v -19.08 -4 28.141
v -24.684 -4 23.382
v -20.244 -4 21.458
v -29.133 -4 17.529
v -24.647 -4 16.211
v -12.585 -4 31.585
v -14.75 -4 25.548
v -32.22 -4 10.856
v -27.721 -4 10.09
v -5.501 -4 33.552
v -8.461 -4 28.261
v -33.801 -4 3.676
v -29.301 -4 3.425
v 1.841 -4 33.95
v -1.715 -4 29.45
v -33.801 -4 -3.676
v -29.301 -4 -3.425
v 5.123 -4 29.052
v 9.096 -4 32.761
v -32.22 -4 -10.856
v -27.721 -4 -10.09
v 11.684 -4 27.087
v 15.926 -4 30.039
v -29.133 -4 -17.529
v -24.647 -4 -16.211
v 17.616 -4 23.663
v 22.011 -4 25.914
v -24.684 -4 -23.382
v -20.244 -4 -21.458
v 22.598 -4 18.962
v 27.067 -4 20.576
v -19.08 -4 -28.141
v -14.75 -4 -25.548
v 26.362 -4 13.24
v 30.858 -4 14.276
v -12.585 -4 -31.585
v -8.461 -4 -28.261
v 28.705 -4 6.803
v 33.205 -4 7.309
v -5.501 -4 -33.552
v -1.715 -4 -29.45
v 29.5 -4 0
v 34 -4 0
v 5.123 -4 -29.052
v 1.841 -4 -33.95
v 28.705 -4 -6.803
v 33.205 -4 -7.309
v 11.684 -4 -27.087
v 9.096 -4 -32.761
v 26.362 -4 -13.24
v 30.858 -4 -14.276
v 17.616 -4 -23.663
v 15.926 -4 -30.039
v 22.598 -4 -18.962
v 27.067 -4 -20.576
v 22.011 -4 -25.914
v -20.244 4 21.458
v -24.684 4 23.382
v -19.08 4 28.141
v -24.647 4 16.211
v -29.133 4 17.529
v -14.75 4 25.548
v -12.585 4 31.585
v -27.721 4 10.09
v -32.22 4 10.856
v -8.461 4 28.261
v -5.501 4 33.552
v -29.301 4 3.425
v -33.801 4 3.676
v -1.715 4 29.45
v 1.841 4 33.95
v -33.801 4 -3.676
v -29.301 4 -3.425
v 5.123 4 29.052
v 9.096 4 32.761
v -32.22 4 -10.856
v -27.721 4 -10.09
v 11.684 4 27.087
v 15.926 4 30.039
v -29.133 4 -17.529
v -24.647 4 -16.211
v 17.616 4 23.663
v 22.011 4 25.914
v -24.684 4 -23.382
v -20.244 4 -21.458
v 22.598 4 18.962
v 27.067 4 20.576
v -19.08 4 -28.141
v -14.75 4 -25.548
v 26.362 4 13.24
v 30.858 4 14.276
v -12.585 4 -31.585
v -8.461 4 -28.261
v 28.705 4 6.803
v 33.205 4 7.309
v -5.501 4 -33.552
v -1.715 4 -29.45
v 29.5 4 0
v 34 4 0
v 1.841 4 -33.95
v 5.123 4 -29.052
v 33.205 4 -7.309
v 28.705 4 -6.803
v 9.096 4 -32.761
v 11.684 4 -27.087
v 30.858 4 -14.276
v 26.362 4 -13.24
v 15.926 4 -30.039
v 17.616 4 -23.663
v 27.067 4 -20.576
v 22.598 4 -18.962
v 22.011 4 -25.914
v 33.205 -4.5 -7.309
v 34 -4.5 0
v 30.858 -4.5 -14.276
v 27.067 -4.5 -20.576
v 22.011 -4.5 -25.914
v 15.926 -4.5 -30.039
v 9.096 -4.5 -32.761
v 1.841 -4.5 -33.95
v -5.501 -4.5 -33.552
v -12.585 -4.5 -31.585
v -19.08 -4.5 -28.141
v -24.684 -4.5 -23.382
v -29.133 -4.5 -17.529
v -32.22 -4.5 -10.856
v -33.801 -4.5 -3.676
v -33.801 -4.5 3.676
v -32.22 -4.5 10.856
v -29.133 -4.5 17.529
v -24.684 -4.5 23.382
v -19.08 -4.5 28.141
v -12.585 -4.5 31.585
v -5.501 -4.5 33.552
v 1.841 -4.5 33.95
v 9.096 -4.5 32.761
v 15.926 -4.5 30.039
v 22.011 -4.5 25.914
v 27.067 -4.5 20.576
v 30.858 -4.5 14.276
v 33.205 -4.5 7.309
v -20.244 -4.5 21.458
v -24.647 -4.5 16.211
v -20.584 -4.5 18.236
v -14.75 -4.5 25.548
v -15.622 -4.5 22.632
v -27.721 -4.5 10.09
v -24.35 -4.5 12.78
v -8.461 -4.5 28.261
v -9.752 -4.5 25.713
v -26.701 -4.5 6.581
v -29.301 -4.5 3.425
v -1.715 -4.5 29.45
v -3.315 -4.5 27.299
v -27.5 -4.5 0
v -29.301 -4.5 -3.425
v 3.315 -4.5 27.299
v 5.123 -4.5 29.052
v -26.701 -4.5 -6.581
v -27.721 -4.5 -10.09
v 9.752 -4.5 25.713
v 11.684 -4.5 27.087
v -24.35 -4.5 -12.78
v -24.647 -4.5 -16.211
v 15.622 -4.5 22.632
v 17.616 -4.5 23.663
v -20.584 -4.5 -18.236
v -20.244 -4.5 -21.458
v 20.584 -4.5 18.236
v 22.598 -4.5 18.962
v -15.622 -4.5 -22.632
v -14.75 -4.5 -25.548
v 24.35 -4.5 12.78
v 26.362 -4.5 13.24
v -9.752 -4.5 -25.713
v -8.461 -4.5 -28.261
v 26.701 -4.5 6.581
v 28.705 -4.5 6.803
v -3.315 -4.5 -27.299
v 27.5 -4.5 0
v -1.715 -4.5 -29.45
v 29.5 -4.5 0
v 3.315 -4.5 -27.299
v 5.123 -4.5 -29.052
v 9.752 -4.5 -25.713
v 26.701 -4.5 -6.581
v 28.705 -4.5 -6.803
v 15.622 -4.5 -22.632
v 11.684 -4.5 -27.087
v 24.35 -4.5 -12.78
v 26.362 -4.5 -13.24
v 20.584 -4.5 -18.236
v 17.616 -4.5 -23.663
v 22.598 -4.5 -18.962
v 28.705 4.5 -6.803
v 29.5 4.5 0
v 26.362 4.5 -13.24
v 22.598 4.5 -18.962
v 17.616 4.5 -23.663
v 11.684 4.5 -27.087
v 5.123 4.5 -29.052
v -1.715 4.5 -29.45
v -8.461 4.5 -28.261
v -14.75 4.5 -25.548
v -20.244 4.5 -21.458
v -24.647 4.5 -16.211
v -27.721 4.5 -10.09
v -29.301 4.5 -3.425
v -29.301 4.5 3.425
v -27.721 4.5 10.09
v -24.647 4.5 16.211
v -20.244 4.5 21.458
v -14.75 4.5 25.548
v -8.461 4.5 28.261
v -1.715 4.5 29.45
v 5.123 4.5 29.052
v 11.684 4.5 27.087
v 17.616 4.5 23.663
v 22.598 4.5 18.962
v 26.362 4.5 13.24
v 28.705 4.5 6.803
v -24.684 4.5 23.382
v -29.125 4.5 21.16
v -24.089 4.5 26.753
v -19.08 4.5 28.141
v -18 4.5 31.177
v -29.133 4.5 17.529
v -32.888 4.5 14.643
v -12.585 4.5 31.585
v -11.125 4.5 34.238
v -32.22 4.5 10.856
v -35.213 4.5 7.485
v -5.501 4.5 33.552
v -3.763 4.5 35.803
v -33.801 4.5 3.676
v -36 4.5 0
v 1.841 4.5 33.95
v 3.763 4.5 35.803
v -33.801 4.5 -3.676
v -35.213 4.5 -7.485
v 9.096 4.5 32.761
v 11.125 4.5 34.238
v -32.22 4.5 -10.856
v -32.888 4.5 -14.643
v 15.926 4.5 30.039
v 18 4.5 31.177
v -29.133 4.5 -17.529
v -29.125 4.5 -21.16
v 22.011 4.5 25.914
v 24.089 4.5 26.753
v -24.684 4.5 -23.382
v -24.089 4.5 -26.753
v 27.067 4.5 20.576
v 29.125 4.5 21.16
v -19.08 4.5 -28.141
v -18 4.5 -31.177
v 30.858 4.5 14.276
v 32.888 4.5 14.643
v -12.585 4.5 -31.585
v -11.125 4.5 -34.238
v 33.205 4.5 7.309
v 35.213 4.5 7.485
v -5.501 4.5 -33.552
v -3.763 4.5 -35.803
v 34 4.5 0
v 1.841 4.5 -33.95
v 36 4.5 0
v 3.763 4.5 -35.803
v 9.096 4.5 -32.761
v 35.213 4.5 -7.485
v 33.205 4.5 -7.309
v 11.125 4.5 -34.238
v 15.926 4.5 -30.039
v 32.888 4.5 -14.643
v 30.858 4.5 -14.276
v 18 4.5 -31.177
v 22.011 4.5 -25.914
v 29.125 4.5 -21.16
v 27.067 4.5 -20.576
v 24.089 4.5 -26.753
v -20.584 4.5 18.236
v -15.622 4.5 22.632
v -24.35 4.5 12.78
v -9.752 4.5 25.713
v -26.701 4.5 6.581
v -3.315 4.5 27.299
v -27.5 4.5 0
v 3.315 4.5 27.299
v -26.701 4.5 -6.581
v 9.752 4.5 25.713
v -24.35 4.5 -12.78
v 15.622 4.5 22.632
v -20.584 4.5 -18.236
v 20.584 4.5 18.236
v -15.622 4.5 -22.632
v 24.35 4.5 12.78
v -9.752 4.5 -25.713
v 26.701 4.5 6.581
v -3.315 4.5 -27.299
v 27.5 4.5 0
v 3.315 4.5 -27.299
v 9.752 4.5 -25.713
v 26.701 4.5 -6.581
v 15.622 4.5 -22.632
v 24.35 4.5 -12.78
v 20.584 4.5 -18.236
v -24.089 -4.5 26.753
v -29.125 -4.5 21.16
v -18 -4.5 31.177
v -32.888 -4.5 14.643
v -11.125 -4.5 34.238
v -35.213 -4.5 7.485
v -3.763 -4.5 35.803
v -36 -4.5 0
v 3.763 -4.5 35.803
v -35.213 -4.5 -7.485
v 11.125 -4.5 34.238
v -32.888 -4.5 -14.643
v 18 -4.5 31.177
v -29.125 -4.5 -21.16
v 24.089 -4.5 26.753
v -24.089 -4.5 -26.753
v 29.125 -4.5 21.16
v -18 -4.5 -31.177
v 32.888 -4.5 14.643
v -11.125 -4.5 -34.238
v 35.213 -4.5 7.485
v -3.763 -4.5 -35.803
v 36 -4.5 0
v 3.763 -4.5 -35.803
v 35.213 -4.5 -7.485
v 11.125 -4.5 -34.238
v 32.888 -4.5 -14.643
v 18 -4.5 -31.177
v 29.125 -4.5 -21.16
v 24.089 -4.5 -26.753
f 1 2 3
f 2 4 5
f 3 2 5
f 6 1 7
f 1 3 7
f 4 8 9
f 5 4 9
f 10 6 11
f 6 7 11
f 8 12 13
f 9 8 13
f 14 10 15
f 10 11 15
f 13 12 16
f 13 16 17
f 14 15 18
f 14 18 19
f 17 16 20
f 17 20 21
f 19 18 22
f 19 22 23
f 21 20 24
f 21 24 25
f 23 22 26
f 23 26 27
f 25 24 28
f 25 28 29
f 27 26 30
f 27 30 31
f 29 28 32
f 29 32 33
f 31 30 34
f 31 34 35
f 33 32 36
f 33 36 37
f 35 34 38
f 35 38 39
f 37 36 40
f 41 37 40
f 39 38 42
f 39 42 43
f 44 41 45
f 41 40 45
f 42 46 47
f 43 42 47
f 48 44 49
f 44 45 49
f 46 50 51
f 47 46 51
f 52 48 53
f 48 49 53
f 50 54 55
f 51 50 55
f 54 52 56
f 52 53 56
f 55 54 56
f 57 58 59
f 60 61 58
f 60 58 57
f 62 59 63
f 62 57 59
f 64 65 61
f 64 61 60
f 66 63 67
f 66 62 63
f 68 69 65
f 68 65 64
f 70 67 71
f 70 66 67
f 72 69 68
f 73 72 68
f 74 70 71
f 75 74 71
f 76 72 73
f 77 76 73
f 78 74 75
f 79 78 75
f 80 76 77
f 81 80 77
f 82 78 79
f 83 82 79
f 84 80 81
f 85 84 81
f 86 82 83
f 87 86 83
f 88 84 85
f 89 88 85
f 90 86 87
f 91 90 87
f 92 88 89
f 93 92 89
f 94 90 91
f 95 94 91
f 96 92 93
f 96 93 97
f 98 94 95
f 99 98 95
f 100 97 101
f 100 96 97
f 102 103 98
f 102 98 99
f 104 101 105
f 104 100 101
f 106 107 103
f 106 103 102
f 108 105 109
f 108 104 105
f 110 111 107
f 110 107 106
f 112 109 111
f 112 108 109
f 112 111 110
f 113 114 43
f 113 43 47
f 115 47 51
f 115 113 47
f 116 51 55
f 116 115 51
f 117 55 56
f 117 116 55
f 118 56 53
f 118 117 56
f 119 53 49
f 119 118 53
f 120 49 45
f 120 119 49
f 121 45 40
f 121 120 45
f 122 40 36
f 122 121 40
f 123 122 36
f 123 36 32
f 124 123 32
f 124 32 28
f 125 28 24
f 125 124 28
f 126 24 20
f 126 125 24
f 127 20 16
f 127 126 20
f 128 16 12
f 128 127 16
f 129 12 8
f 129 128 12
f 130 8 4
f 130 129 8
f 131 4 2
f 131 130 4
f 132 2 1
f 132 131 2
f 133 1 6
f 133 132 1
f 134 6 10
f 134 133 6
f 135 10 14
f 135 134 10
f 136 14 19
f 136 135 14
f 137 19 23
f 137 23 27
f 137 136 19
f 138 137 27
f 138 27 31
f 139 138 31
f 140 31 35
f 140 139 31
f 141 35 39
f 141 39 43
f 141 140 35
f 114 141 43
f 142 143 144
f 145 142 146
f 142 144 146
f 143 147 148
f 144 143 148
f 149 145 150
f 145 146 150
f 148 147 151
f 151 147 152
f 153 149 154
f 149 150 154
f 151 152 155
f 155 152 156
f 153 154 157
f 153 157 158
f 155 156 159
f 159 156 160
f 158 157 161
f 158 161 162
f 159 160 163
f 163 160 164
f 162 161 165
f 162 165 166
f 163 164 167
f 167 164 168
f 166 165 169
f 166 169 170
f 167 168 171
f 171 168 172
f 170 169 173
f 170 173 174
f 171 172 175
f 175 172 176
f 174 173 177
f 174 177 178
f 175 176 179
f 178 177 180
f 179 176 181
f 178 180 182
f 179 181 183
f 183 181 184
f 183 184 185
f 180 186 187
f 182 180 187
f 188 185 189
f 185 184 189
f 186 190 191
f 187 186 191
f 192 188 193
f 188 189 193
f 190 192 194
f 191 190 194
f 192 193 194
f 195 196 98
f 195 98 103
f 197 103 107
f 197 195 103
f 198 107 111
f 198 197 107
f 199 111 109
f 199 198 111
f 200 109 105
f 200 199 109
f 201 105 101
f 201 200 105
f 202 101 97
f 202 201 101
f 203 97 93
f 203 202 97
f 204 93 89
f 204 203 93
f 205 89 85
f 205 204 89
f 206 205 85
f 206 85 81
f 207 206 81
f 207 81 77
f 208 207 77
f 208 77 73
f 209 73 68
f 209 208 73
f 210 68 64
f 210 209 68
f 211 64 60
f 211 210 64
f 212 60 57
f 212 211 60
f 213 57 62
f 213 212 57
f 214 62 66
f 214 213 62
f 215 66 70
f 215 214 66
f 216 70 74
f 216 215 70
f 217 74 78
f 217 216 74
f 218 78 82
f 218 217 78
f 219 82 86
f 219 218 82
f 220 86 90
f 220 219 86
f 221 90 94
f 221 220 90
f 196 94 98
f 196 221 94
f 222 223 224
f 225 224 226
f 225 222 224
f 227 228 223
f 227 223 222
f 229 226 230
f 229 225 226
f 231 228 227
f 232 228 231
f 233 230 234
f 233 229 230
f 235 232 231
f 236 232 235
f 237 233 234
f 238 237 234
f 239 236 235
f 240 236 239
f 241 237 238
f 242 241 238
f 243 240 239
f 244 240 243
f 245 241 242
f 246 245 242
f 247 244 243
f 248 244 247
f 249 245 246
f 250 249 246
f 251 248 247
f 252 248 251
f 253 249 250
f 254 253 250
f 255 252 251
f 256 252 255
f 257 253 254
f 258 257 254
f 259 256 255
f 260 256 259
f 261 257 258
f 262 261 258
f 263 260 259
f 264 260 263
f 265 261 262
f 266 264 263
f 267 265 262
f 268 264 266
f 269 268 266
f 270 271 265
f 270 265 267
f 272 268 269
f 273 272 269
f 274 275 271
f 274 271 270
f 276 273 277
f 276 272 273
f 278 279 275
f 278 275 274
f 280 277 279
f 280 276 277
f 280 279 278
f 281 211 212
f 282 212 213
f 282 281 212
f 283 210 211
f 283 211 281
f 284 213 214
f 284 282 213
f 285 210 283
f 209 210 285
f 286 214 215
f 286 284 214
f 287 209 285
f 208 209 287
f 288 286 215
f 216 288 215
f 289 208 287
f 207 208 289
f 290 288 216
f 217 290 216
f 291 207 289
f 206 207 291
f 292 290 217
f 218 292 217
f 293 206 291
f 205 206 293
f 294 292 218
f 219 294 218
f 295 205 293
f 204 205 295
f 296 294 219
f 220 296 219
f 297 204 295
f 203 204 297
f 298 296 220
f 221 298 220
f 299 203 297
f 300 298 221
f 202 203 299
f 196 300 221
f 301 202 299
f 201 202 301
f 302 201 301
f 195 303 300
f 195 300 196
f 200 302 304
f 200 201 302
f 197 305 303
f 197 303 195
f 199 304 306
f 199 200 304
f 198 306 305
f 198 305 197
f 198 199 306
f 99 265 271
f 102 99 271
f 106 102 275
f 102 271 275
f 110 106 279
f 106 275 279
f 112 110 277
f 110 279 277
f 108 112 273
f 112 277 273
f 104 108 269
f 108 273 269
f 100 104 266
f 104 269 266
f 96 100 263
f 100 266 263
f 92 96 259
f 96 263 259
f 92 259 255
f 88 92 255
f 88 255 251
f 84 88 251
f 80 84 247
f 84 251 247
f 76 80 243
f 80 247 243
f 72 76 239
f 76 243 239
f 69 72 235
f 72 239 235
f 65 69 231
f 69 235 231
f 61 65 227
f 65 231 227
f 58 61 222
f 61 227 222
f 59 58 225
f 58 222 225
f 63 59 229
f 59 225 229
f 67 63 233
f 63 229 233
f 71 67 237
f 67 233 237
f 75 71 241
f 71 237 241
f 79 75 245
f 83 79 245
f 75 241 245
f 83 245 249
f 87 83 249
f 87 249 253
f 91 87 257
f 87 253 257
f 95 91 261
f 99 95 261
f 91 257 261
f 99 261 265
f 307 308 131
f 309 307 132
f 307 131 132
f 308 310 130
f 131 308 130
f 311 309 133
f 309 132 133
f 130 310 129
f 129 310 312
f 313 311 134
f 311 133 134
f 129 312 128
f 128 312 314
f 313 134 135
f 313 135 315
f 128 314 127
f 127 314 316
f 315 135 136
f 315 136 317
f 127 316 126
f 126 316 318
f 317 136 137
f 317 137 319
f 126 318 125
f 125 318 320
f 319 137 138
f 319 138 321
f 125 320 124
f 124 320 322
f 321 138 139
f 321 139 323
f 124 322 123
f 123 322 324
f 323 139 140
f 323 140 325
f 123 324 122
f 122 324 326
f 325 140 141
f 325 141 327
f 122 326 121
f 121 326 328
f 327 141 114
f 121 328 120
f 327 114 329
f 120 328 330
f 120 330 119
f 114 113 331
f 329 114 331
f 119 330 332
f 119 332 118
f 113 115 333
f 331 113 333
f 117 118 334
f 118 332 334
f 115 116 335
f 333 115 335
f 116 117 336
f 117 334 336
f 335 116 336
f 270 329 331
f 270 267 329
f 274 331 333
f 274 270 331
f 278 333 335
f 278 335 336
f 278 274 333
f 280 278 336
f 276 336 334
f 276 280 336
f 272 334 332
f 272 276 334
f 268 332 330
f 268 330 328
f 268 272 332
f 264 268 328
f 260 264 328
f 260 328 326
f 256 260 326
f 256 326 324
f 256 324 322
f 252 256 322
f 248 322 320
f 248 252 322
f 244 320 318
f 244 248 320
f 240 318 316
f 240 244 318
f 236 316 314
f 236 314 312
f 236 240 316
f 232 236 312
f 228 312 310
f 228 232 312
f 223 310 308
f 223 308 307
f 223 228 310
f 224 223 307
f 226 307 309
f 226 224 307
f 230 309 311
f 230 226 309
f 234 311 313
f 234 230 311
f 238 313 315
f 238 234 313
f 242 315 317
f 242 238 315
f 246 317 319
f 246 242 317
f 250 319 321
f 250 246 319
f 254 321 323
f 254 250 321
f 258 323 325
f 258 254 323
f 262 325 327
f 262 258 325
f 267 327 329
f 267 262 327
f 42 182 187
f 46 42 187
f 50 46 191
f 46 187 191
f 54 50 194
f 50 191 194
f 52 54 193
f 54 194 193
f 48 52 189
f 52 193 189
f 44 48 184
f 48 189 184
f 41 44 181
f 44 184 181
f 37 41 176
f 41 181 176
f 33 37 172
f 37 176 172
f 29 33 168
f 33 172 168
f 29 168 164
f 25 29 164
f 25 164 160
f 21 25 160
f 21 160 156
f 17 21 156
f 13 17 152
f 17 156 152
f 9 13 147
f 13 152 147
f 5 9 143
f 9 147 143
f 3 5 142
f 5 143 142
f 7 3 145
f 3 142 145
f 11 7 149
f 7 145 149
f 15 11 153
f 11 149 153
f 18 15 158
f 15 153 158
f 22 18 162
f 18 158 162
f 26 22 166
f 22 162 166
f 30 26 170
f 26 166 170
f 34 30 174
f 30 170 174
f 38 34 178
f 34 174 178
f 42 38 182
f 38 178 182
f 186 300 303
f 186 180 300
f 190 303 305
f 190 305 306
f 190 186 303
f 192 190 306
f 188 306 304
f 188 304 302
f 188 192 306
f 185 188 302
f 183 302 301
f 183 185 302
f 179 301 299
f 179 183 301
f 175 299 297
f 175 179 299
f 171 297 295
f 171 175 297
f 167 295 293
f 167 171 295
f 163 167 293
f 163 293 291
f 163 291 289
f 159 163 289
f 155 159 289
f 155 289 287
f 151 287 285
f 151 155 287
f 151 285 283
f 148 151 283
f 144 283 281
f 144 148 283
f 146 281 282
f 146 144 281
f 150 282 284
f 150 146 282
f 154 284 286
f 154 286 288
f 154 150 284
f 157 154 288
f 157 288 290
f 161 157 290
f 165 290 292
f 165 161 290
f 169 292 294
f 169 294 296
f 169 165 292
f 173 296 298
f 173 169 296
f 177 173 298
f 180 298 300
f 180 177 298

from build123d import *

# Parameters (mm, degrees)
SKETCH_1_R          = 36
SKETCH_1_R_2        = 27.5
EXTRUDE_1_DEPTH     = 4.5
SKETCH_3_R          = 34
SKETCH_3_R_2        = 29.5
CUT_EXTRUDE_1_DEPTH = 0.5


with BuildPart() as part:
    # 草图1 → 凸台-拉伸1 (new body, symmetric)
    with BuildSketch(Plane(origin=(0, 0, 0), x_dir=(1, 0, 0), z_dir=(0, 1, 0))):
        Circle(SKETCH_1_R)
        Circle(SKETCH_1_R_2, mode=Mode.SUBTRACT)
    extrude(amount=EXTRUDE_1_DEPTH, both=True)

    # 草图3 → 切除-拉伸1 (cut)
    with BuildSketch(Plane(origin=(0, 4.5, 0), x_dir=(1, 0, 0), z_dir=(0, 1, 0))):
        Circle(SKETCH_3_R)
        Circle(SKETCH_3_R_2, mode=Mode.SUBTRACT)
    cut_extrude_1 = extrude(amount=-CUT_EXTRUDE_1_DEPTH, mode=Mode.SUBTRACT)

    # 镜向1: 切除-拉伸1 across plane
    add(cut_extrude_1.mirror(Plane.ZX), mode=Mode.SUBTRACT)


solid = part.part
